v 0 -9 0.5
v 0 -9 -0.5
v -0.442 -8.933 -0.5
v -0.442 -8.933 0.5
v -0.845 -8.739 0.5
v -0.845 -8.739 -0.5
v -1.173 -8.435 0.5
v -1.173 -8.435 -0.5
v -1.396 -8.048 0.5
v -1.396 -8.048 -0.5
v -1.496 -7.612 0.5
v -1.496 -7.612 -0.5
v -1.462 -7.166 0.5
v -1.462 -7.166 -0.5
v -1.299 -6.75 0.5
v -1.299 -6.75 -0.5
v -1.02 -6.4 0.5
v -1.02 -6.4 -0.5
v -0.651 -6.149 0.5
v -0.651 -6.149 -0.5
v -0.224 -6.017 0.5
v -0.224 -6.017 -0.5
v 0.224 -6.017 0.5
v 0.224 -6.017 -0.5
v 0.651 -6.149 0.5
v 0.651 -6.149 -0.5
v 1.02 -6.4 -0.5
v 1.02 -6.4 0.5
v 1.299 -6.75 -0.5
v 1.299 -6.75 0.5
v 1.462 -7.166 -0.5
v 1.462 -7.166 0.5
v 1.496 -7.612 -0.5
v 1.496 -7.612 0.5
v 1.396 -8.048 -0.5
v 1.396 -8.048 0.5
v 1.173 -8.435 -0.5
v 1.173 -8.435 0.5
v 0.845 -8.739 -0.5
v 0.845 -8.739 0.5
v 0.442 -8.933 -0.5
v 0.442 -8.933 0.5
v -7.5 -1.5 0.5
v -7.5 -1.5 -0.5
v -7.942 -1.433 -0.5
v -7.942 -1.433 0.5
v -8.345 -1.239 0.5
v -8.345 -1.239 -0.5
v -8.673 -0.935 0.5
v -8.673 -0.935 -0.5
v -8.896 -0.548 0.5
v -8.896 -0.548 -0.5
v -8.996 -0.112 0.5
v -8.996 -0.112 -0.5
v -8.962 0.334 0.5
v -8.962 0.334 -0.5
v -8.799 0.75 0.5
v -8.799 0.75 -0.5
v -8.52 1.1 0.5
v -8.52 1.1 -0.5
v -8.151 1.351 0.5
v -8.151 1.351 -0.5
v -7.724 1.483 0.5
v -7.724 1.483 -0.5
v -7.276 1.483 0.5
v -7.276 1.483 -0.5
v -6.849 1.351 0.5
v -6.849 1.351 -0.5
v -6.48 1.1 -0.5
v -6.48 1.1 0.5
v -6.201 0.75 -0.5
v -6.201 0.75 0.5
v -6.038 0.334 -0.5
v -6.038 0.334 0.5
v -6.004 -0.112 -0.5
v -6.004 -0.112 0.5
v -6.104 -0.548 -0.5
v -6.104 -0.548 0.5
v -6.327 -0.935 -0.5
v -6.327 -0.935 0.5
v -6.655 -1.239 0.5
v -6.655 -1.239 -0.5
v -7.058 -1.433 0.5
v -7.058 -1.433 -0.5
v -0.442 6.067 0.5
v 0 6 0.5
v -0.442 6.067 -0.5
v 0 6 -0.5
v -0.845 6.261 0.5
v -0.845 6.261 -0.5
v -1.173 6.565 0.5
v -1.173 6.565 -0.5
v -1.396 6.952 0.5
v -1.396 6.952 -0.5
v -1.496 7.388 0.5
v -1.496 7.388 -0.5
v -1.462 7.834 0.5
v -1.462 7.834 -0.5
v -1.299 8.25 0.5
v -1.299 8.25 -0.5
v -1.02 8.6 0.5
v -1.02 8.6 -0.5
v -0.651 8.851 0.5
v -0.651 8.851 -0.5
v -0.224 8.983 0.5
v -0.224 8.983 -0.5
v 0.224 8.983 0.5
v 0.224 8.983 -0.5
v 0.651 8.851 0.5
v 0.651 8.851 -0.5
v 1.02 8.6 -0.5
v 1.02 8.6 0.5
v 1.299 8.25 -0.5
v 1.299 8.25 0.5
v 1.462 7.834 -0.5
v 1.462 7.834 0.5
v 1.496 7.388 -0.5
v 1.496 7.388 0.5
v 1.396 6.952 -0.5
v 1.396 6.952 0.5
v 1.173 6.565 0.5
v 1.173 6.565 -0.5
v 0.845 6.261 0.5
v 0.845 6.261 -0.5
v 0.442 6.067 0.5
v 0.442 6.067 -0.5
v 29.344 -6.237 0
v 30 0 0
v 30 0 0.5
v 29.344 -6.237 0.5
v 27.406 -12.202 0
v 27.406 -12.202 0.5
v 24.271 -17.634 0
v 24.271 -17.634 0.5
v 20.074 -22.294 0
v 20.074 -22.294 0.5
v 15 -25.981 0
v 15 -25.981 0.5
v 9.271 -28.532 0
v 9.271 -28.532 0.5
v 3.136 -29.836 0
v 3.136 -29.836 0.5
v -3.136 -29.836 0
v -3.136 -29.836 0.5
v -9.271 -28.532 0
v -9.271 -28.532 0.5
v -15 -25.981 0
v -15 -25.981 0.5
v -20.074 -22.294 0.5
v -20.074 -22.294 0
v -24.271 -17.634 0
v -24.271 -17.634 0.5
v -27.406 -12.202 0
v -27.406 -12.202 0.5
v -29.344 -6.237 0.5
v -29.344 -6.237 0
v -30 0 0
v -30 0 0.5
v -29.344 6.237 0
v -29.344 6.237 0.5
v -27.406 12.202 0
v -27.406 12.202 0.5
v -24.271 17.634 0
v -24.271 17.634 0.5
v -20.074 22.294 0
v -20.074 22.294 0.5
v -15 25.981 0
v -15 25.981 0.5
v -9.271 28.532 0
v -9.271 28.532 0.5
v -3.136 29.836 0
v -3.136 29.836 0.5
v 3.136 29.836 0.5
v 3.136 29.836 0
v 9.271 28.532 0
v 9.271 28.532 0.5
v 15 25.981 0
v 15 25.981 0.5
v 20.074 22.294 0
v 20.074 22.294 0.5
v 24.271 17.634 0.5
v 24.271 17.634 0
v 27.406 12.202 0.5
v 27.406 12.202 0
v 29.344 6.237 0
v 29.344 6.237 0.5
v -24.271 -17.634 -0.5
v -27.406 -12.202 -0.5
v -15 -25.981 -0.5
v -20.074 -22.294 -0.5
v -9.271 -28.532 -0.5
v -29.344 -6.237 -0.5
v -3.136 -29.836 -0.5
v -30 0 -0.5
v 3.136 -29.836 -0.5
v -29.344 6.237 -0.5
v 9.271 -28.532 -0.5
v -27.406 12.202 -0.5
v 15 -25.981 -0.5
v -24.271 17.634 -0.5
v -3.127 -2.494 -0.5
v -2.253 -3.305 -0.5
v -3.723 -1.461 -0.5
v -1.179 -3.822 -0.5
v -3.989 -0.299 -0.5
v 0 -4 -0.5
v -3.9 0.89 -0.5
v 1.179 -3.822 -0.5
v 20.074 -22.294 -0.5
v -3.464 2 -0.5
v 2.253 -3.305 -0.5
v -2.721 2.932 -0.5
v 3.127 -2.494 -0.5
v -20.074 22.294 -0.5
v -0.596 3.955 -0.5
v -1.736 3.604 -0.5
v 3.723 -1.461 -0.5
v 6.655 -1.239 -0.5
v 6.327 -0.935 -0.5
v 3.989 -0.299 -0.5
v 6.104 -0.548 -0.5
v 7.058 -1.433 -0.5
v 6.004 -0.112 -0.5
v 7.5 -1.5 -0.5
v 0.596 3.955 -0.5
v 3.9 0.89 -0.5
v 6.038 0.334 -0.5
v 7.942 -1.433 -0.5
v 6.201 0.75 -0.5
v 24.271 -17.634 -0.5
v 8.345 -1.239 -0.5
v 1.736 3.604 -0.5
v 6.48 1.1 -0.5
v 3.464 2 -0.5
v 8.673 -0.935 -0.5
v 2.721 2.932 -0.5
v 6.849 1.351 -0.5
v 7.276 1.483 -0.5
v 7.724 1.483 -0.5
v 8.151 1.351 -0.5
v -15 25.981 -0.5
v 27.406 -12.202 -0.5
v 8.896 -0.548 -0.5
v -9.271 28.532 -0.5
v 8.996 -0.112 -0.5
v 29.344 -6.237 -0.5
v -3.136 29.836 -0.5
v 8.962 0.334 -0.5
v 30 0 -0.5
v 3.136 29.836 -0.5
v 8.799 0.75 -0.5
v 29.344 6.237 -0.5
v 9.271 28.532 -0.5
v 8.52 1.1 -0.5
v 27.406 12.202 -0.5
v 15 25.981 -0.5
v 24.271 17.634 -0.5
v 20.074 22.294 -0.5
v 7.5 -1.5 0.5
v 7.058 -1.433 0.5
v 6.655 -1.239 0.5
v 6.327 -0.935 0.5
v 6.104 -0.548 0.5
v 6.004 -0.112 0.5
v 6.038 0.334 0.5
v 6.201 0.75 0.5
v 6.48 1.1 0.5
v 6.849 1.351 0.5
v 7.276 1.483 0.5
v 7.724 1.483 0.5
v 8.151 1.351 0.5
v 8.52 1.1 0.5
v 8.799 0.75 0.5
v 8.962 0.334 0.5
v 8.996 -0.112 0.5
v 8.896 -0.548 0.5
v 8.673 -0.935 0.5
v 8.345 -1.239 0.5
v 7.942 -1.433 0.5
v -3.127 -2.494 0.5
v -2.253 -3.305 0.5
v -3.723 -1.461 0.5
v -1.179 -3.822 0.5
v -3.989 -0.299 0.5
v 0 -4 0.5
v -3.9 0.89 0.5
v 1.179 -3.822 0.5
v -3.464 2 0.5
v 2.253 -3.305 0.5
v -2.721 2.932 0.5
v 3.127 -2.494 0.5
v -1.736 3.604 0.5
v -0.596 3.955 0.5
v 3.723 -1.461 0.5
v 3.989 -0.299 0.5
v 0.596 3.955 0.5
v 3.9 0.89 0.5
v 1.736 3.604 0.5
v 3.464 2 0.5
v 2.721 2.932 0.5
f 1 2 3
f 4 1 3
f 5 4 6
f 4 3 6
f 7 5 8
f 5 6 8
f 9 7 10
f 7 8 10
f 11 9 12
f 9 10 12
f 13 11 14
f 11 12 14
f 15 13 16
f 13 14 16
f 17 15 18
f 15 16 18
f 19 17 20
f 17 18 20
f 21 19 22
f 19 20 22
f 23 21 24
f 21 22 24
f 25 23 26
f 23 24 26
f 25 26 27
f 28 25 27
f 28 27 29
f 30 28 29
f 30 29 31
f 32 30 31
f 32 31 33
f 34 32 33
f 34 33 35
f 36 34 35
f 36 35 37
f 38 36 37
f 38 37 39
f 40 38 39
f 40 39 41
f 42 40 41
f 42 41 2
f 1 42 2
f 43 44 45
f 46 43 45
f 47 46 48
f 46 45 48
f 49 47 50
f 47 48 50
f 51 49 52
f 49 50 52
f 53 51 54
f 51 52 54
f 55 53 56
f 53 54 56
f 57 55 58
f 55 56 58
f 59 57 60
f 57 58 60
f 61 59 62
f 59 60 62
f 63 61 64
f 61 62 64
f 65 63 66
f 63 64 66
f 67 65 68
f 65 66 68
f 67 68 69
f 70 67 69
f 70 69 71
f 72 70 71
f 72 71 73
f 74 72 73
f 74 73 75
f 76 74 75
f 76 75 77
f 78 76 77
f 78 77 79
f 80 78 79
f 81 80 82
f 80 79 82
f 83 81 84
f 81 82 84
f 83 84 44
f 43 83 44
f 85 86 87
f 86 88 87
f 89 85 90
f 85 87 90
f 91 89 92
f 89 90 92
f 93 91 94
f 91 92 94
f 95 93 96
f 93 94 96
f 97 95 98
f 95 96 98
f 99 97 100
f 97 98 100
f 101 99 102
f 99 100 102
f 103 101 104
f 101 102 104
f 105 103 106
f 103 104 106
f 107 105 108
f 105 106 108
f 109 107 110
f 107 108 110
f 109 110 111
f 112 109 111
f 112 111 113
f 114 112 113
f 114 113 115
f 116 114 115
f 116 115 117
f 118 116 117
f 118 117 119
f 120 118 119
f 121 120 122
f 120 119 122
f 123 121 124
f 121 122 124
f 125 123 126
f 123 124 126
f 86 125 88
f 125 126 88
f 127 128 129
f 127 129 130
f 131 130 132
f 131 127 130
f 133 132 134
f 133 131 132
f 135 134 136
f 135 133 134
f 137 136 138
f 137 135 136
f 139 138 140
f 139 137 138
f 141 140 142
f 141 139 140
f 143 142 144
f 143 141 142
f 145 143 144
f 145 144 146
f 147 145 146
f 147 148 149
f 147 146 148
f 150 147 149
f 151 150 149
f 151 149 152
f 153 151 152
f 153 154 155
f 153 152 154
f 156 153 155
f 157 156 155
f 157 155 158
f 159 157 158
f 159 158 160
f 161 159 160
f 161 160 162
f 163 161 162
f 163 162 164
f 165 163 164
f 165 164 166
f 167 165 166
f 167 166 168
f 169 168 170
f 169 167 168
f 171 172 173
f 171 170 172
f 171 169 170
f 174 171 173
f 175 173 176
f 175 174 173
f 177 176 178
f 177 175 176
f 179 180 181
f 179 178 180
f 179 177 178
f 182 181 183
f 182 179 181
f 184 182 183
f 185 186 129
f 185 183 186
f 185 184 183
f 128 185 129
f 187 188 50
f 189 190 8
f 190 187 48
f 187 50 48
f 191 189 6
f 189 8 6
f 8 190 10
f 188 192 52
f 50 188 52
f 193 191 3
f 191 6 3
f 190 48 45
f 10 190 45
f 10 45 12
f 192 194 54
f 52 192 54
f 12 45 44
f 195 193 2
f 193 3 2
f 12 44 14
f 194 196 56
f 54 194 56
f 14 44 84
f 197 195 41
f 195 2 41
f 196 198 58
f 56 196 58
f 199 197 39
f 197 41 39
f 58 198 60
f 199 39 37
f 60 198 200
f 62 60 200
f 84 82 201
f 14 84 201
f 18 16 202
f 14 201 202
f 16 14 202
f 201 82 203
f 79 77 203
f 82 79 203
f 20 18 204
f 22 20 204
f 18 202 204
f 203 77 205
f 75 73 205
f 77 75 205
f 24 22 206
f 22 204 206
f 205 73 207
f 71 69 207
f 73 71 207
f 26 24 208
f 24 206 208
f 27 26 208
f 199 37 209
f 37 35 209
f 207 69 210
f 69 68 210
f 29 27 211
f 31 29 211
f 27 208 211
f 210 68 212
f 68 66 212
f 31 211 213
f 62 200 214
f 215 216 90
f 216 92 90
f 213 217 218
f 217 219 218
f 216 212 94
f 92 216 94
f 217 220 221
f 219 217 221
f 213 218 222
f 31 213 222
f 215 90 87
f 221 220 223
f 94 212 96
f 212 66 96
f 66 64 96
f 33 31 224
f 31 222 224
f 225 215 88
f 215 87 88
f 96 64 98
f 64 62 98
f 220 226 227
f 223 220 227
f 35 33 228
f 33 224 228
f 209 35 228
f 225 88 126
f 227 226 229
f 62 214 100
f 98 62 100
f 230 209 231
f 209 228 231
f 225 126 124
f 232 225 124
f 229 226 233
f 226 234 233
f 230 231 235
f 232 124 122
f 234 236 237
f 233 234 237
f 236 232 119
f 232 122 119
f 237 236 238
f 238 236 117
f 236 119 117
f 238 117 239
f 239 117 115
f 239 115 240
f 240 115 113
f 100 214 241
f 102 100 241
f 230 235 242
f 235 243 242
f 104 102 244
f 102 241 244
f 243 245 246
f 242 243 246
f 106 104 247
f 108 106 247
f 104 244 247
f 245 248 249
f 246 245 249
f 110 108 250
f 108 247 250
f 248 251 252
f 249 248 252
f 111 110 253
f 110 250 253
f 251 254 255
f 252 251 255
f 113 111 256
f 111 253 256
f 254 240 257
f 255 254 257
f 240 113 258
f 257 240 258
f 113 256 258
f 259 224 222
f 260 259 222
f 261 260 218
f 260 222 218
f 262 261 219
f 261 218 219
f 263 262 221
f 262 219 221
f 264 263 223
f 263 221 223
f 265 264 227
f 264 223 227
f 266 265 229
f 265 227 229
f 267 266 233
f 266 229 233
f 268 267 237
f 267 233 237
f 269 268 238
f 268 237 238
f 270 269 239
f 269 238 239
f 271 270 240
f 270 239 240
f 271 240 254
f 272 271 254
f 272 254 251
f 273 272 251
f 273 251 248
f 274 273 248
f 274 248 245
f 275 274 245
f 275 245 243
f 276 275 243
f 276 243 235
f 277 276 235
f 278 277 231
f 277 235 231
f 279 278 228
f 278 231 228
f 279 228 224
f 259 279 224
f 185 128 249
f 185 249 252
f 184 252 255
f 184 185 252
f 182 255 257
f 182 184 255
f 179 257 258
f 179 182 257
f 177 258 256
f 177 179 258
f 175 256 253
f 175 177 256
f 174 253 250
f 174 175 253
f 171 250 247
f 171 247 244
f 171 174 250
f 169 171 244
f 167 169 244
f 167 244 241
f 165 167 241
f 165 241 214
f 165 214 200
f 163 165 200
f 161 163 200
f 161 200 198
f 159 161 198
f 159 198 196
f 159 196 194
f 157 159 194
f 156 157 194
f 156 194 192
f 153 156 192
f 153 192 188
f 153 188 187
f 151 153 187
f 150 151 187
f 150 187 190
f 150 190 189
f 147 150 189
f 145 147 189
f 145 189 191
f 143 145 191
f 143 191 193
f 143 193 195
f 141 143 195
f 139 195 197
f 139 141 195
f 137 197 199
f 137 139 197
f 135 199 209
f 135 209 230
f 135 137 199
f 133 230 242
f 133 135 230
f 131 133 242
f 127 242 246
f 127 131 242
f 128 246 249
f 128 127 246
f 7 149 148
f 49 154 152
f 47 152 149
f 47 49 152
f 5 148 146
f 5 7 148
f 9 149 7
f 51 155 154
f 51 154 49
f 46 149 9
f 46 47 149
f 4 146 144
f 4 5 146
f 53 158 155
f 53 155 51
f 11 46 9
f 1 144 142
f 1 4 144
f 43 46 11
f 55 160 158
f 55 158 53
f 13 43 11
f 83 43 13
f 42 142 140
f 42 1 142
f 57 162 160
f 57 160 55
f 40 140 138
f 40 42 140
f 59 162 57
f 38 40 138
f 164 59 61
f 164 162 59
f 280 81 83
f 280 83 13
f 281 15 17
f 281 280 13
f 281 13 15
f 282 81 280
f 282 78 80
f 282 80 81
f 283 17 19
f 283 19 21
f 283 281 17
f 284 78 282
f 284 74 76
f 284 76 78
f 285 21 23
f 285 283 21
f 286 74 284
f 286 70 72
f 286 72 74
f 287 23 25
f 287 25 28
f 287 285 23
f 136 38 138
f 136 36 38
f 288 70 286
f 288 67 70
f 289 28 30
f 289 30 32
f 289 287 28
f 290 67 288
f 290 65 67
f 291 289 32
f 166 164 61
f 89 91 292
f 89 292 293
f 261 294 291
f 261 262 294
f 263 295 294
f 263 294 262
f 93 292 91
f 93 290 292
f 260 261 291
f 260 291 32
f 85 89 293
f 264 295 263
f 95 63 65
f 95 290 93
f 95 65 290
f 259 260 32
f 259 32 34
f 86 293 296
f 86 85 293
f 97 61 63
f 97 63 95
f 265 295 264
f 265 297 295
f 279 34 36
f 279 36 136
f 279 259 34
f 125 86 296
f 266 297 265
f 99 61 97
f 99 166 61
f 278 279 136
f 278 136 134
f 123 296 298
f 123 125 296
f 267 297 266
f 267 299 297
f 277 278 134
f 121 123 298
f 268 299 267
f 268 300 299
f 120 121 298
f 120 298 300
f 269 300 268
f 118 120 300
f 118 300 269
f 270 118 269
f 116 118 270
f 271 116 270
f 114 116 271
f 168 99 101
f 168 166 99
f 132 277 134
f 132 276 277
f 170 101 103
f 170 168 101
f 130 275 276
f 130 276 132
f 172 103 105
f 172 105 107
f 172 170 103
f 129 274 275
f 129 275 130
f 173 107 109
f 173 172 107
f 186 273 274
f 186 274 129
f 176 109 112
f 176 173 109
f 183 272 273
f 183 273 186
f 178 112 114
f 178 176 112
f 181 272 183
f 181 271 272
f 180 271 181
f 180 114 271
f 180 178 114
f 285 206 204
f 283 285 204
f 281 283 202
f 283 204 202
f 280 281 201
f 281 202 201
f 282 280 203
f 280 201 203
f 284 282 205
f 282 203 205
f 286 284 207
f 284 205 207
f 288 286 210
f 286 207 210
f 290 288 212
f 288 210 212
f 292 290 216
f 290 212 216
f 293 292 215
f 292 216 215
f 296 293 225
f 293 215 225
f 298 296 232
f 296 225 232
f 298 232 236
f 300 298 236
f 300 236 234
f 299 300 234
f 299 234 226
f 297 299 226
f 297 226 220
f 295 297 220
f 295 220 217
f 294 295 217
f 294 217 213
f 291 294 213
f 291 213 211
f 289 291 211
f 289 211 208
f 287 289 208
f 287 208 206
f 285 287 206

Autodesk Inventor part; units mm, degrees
ref_plane "YZ Plane" through (0, 0, 0) normal (1, 0, 0) x (0, 1, 0)
ref_plane "XZ Plane" through (0, 0, 0) normal (0, 1, 0) x (-1, 0, 0)
ref_plane "XY Plane" through (0, 0, 0) normal (0, 0, 1) x (1, 0, 0)
sketch "Sketch1" plane through (0, 0, 0) normal (0, 0, 1) x (1, 0, 0)
  circle A0 centre (0, 0) radius 30
  dimension "d0" = 60
extrude "Extrusion1" add sketch "Sketch1" along normal mid plane 1
sketch "Sketch2" plane through (0, 0, 0.5) normal (0, 0, 1) x (1, 0, 0)
  point P0 (0, 0)
  point P1 (0, 0)
hole "Hole1" at (0, 0, 0.5) direction (0, 0, -1) diameter 8 end through all
sketch "Sketch3" plane through (0, 0, 0.5) normal (0, 0, 1) x (1, 0, 0)
  circle A0 centre (0, 0) radius 4 projected
  circle A1 centre (0, 0) radius 7.5 construction
  point P0 (-7.5, 0)
  point P1 (0, 7.5)
  point P2 (7.5, 0)
  point P3 (0, -7.5)
  dimension "d10" = 15
hole "Hole2" at (-7.5, 0, 0.5) at (0, 7.5, 0.5) at (7.5, 0, 0.5) at (0, -7.5, 0.5) direction (0, 0, -1) diameter 3 end through all
properties part number "plate" material "Steel"
